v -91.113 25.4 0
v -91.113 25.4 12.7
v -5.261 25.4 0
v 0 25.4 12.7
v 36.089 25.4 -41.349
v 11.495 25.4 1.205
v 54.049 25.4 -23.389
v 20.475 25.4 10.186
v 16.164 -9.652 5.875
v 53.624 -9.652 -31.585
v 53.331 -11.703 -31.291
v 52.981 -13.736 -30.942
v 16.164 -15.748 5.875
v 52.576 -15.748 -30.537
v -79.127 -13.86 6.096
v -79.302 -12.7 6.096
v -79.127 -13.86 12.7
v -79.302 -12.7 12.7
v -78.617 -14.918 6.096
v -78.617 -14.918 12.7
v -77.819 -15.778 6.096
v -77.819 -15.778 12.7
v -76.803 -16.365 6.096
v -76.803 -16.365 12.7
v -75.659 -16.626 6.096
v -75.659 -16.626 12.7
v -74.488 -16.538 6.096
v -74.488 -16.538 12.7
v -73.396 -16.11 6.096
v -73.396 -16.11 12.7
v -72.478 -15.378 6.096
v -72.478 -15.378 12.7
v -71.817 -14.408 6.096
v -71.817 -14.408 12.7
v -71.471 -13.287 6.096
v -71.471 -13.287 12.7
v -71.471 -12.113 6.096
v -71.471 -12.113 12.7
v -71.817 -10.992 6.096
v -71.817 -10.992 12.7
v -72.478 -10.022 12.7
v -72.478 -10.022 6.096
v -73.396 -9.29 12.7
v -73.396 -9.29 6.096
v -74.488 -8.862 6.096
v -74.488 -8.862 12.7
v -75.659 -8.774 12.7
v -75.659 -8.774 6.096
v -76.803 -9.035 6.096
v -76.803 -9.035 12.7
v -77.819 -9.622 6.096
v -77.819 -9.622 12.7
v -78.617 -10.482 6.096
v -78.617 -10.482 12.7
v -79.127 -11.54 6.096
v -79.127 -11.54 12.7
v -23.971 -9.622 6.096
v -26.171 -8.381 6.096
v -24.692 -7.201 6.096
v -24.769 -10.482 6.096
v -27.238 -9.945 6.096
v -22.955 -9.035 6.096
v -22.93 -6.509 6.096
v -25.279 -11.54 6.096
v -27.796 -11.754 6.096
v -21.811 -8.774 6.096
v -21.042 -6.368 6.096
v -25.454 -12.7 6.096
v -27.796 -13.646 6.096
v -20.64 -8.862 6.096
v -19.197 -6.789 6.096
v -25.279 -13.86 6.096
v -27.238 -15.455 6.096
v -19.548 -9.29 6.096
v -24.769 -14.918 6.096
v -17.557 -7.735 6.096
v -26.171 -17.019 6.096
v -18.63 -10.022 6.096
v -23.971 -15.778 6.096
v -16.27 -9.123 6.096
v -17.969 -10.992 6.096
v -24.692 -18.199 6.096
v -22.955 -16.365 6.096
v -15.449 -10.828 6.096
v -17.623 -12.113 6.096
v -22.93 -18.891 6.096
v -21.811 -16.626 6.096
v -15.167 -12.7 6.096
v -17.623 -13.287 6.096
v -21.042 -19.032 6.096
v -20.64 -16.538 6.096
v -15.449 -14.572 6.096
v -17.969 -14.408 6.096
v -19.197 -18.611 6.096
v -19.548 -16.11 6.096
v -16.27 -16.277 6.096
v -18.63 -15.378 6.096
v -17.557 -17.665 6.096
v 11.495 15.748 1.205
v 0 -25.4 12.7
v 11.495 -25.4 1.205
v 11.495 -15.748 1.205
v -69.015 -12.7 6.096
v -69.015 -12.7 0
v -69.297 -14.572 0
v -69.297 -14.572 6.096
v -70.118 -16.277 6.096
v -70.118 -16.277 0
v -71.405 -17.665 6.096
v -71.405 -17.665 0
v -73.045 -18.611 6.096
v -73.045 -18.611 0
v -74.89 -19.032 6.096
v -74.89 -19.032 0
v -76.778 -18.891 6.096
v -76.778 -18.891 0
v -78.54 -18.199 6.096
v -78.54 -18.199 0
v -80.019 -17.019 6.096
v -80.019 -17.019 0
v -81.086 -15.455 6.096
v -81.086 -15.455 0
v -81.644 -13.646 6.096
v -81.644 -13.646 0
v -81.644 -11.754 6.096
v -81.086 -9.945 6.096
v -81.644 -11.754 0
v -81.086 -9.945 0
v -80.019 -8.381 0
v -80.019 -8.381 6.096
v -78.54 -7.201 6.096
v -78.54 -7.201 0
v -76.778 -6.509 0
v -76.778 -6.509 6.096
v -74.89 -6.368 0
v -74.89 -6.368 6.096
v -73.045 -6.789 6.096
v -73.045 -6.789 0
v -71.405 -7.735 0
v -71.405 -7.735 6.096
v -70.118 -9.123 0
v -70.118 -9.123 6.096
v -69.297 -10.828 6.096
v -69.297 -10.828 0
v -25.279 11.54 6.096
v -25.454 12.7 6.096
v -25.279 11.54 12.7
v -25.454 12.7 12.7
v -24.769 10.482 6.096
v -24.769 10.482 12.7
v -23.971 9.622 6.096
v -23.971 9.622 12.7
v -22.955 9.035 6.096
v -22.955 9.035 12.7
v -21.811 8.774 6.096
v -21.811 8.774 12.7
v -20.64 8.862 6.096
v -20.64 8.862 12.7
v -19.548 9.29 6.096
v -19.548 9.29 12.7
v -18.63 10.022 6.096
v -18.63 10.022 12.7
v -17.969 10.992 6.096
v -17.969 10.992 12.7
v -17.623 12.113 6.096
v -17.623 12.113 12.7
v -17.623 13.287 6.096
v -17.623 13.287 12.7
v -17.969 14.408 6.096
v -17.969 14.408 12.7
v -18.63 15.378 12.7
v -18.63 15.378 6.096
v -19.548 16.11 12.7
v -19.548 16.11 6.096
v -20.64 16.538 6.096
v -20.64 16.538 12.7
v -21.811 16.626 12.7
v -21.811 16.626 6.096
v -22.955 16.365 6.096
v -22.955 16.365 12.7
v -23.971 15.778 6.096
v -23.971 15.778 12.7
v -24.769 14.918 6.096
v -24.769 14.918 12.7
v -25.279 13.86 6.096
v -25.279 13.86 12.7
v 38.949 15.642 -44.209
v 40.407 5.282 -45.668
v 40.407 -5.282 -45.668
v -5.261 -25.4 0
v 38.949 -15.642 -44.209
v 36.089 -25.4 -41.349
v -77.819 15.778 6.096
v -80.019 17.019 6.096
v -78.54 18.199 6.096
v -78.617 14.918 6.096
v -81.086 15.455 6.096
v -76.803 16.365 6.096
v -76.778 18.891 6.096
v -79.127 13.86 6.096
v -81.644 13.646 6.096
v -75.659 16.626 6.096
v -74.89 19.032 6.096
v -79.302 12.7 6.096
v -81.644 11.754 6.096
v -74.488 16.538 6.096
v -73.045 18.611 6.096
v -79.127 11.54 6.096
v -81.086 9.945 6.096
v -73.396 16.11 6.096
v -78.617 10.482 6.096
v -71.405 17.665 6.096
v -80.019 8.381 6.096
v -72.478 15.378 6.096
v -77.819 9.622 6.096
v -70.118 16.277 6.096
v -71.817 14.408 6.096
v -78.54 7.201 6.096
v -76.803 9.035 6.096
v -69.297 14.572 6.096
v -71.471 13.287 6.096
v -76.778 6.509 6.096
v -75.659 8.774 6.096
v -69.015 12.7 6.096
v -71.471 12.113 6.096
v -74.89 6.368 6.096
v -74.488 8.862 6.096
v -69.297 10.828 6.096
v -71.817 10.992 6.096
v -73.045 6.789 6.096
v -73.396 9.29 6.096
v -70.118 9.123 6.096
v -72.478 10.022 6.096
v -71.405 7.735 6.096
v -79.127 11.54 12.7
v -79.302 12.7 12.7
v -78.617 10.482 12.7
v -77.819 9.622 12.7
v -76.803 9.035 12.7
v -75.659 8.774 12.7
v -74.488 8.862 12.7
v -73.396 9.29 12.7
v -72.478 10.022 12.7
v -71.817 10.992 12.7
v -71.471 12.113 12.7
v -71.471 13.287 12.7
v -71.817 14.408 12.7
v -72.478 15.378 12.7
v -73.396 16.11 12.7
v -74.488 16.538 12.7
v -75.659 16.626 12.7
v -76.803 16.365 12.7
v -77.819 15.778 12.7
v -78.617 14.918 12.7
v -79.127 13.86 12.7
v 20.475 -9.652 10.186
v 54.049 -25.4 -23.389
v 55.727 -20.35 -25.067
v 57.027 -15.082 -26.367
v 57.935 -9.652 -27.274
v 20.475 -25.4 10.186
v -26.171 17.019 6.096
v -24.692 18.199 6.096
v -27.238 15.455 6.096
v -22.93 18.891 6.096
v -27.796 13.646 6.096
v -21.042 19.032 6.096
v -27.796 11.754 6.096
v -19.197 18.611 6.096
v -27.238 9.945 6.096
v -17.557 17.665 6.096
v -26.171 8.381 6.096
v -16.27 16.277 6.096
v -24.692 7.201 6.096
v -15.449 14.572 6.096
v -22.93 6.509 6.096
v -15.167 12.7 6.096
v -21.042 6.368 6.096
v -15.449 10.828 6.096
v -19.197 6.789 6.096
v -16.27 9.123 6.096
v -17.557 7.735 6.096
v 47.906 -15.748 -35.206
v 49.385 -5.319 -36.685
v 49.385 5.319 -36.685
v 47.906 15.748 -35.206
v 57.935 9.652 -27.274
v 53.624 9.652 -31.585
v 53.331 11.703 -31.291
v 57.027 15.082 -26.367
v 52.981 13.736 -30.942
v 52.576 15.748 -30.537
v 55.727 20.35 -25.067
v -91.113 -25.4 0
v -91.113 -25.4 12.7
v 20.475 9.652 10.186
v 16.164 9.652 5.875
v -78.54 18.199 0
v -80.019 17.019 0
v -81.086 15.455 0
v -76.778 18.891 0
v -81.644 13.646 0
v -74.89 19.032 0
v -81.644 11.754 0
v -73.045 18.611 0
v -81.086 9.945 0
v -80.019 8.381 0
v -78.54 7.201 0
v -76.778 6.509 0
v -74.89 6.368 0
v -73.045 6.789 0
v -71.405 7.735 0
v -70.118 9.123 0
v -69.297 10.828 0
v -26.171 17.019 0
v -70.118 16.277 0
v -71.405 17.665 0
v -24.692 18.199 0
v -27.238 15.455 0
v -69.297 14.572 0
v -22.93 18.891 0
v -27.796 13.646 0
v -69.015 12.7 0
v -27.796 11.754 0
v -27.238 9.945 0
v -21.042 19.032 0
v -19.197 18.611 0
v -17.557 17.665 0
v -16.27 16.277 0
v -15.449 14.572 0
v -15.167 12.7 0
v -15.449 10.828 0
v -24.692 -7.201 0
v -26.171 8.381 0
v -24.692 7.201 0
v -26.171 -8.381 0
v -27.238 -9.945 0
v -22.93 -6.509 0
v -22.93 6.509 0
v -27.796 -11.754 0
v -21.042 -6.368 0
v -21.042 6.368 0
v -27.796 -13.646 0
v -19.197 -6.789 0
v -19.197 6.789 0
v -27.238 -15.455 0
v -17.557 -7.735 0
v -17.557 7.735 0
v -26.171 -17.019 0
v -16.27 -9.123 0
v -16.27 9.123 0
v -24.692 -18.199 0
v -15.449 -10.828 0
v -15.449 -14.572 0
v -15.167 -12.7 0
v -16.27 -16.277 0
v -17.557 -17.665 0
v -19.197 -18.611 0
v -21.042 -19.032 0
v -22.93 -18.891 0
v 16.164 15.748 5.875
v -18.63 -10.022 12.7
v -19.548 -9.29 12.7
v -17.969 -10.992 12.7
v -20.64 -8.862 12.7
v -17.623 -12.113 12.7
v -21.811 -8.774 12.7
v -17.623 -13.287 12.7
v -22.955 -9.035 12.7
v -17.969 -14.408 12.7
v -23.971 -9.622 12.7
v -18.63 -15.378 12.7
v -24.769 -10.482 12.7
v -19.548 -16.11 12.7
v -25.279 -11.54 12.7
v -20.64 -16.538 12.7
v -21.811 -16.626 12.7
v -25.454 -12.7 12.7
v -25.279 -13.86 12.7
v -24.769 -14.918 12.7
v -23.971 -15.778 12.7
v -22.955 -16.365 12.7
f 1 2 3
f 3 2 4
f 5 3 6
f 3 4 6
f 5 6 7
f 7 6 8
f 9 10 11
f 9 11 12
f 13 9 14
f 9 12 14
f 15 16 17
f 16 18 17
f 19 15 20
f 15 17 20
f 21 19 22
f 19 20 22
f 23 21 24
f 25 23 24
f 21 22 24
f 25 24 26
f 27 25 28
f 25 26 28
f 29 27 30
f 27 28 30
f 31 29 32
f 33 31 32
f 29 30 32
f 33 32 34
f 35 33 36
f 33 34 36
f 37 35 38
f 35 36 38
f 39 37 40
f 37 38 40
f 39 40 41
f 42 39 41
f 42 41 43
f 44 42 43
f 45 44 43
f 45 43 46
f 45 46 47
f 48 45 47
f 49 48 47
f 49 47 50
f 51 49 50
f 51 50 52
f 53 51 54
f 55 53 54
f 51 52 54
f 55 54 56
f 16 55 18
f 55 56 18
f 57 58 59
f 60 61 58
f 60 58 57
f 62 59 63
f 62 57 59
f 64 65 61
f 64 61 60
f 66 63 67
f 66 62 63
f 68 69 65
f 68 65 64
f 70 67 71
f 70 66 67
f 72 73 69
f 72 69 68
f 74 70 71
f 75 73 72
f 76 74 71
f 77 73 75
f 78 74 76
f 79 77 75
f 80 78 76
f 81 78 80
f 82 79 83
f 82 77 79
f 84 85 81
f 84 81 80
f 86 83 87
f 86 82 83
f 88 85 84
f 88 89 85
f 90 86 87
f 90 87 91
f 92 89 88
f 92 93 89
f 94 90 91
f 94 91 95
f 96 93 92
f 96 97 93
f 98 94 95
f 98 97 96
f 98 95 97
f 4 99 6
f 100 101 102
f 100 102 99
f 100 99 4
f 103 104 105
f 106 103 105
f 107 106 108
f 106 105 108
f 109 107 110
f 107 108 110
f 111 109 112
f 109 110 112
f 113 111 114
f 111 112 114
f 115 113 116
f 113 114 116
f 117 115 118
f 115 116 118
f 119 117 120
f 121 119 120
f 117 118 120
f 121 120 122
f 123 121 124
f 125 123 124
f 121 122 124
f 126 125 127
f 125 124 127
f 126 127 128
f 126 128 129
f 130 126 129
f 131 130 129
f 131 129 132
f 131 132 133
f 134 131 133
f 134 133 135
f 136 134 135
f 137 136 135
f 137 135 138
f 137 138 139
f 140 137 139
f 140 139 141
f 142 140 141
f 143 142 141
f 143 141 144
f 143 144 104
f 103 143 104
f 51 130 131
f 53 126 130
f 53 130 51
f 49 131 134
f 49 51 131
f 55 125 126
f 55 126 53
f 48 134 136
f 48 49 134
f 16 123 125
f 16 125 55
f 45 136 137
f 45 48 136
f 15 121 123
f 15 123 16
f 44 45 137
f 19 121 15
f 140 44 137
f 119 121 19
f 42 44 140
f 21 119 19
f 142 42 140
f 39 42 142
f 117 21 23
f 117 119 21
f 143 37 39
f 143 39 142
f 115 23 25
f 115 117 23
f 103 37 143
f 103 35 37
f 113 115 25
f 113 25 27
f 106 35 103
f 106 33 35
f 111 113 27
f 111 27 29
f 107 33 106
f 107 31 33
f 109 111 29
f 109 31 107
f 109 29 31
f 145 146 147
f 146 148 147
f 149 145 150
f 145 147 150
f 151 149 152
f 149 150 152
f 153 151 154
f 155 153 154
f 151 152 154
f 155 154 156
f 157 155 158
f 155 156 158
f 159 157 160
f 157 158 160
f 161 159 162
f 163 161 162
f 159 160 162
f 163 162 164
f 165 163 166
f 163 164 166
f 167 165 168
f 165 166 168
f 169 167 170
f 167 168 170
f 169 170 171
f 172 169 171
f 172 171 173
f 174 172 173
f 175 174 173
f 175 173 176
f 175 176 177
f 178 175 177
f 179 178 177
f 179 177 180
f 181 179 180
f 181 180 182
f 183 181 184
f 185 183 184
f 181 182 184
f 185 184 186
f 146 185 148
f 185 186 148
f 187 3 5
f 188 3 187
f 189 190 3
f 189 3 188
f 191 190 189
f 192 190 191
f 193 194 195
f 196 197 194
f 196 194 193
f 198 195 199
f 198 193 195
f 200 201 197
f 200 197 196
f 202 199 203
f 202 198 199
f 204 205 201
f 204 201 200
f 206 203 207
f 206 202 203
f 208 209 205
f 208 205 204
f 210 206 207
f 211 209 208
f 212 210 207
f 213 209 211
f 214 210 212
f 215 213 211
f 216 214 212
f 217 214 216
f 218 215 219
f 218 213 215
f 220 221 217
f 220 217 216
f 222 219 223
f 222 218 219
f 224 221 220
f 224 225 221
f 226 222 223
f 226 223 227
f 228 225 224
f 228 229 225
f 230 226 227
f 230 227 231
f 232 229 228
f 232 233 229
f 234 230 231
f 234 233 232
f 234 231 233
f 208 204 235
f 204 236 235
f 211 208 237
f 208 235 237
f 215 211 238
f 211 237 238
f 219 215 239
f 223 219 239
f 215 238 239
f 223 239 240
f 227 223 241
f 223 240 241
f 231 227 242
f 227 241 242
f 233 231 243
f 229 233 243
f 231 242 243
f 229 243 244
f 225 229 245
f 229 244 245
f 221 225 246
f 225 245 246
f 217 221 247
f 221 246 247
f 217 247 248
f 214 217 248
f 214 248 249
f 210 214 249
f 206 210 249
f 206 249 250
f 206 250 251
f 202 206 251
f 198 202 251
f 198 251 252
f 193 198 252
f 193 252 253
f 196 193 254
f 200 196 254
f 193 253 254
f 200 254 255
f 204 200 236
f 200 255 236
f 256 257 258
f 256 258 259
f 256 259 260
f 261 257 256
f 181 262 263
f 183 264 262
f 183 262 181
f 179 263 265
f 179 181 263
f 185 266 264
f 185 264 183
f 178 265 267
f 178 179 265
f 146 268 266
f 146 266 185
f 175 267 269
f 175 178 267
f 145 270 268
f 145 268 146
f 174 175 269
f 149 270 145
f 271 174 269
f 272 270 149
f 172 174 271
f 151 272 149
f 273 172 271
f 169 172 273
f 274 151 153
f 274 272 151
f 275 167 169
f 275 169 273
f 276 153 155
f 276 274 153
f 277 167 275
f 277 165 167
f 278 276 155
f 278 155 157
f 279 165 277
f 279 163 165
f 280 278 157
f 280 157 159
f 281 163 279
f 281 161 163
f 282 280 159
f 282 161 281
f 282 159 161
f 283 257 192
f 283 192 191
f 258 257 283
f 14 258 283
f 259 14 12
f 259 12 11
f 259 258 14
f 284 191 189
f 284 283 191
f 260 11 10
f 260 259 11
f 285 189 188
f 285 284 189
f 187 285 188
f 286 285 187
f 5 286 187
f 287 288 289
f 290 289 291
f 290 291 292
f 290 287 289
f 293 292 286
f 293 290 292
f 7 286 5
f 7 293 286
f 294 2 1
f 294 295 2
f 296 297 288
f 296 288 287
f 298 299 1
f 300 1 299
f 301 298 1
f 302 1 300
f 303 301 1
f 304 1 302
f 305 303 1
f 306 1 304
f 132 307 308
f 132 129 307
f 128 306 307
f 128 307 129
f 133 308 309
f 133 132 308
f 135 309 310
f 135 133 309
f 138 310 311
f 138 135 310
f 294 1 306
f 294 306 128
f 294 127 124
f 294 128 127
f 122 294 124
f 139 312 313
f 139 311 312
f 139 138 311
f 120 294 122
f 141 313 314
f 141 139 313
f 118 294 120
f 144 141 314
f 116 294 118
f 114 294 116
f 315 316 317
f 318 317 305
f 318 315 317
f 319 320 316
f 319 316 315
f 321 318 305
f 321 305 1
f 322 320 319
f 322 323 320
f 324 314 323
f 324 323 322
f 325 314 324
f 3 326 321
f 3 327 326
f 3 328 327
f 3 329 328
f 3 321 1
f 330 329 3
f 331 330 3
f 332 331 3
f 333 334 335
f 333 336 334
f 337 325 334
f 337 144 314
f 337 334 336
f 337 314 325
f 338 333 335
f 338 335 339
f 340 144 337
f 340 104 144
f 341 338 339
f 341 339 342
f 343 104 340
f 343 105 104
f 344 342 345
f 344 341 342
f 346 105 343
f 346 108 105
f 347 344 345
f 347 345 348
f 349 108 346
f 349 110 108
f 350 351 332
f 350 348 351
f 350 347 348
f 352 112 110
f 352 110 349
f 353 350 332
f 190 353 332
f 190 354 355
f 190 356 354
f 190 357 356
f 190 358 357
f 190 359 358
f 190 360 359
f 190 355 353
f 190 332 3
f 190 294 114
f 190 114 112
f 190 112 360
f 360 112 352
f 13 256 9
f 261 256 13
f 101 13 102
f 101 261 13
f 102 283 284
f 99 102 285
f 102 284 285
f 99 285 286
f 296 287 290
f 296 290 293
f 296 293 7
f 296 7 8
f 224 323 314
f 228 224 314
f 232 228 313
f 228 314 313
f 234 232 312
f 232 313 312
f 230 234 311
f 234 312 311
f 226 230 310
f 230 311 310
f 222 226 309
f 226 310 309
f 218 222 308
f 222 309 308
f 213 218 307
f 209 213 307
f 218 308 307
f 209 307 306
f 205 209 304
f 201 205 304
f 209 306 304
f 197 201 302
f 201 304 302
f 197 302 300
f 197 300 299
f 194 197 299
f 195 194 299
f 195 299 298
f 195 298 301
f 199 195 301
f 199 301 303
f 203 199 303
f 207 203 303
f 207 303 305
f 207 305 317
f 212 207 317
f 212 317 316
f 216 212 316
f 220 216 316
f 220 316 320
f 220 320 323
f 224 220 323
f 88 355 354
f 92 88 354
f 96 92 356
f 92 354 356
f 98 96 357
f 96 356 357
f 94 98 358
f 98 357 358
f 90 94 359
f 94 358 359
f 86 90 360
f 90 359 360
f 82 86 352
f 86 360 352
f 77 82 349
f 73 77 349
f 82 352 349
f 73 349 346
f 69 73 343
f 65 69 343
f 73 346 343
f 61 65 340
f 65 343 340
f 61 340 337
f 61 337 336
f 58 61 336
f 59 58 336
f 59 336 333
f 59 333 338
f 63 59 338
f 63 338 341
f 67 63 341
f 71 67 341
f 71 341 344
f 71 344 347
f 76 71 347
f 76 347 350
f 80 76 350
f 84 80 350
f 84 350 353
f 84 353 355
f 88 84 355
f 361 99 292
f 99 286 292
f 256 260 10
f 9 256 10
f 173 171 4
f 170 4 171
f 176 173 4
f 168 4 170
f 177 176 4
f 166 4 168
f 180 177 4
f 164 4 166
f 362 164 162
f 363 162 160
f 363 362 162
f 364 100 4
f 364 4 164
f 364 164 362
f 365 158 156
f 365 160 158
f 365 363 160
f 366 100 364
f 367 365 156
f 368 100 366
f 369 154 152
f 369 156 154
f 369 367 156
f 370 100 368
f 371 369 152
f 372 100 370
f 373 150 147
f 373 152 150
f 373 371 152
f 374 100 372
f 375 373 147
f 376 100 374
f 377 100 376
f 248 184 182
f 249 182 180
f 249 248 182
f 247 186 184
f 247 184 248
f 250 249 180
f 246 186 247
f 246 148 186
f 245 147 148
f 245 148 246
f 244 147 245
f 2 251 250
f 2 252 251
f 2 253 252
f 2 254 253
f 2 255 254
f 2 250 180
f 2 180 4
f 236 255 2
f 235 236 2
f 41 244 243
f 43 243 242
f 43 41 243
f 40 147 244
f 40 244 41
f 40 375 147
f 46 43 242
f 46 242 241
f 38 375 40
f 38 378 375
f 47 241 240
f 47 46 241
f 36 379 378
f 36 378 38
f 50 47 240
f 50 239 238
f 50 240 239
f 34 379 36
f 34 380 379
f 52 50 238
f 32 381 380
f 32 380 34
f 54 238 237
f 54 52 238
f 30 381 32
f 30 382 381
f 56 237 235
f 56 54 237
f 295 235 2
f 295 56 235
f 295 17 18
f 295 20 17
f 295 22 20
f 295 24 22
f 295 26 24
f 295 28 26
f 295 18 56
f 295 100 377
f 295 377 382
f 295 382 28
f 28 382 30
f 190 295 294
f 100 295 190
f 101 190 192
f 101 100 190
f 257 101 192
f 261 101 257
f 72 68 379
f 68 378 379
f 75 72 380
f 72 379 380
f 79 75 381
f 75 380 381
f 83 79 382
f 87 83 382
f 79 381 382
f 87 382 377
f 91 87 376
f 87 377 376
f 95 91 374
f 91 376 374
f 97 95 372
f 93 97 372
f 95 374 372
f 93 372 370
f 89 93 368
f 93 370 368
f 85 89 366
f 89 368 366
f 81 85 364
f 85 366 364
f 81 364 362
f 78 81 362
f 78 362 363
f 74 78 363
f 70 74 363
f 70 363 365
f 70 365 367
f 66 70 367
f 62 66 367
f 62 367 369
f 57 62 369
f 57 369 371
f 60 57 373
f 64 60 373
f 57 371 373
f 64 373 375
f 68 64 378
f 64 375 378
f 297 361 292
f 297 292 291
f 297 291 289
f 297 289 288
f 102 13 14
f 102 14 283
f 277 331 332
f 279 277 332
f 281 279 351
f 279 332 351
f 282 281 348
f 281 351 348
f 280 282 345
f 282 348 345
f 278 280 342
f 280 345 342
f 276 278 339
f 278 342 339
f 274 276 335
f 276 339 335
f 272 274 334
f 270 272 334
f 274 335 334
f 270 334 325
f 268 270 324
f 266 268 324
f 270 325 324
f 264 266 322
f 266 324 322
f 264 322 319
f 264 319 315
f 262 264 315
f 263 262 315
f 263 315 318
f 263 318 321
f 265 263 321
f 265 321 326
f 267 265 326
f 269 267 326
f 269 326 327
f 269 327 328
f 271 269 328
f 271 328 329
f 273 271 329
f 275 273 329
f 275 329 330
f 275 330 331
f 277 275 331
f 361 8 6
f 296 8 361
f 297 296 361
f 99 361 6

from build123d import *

# Parameters (mm, degrees)
F1_DEPTH       = 25.4
F3_D           = 7.874
F3_CBORE_D     = 12.7
F3_CBORE_DEPTH = 6.096
F5_DEPTH       = 134.531275
F7_DEPTH       = 118.529275


with BuildPart() as f1:
    # F0 (on Front) → F1 (new body, symmetric)
    with BuildSketch(Plane.XZ):
        Polygon((-91.112512, 12.7), (-91.112512, 0), (-5.260512, 0), (40.590758, -45.85127), (49.571014, -36.871014), (58.55127, -27.890758), (20.474984, 10.185528), (11.494728, 1.205272), (0, 12.7), align=None)
    extrude(amount=F1_DEPTH, both=True)

    # F3 (through all)
    with Locations(Plane(origin=(0, 0, 0), x_dir=(1, 0, 0), z_dir=(0, 0, -1))):
        with Locations((-75.364512, 12.7), (-75.364512, -12.7), (-21.516512, -12.7), (-21.516512, 12.7)):
            CounterBoreHole(F3_D / 2, F3_CBORE_D / 2, F3_CBORE_DEPTH)

    # F4 (on face) → F5 (cut, through all)
    with BuildSketch(Plane(origin=(43.221014, 0, -43.221014), x_dir=(0, 1, 0), z_dir=(0.707107, 0, -0.707107))):
        Polygon((9.652, 21.680256), (-9.652, 21.680256), (-9.652, 15.584256), (-15.748, 15.584256), (-15.748, 8.980256), (15.748, 8.980256), (15.748, 15.584256), (9.652, 15.584256), align=None)
    extrude(amount=-F5_DEPTH, mode=Mode.SUBTRACT)

    # F6 (on face) → F7 (intersect, through all)
    with BuildSketch(Plane(origin=(15.330256, 0, 15.330256), x_dir=(0, 1, 0), z_dir=(0.707107, 0, 0.707107))):
        with BuildLine():
            ThreePointArc((-53.848, -7.275744), (0, -61.123744), (53.848, -7.275744))
            Line((53.848, -7.275744), (-53.848, -7.275744))
        make_face()
        Polygon((-53.848, -7.275744), (53.848, -7.275744), (31.523697, 119.548529), (-64.190522, 119.548529), align=None)
    extrude(amount=-F7_DEPTH, mode=Mode.INTERSECT)


solid = f1.part
